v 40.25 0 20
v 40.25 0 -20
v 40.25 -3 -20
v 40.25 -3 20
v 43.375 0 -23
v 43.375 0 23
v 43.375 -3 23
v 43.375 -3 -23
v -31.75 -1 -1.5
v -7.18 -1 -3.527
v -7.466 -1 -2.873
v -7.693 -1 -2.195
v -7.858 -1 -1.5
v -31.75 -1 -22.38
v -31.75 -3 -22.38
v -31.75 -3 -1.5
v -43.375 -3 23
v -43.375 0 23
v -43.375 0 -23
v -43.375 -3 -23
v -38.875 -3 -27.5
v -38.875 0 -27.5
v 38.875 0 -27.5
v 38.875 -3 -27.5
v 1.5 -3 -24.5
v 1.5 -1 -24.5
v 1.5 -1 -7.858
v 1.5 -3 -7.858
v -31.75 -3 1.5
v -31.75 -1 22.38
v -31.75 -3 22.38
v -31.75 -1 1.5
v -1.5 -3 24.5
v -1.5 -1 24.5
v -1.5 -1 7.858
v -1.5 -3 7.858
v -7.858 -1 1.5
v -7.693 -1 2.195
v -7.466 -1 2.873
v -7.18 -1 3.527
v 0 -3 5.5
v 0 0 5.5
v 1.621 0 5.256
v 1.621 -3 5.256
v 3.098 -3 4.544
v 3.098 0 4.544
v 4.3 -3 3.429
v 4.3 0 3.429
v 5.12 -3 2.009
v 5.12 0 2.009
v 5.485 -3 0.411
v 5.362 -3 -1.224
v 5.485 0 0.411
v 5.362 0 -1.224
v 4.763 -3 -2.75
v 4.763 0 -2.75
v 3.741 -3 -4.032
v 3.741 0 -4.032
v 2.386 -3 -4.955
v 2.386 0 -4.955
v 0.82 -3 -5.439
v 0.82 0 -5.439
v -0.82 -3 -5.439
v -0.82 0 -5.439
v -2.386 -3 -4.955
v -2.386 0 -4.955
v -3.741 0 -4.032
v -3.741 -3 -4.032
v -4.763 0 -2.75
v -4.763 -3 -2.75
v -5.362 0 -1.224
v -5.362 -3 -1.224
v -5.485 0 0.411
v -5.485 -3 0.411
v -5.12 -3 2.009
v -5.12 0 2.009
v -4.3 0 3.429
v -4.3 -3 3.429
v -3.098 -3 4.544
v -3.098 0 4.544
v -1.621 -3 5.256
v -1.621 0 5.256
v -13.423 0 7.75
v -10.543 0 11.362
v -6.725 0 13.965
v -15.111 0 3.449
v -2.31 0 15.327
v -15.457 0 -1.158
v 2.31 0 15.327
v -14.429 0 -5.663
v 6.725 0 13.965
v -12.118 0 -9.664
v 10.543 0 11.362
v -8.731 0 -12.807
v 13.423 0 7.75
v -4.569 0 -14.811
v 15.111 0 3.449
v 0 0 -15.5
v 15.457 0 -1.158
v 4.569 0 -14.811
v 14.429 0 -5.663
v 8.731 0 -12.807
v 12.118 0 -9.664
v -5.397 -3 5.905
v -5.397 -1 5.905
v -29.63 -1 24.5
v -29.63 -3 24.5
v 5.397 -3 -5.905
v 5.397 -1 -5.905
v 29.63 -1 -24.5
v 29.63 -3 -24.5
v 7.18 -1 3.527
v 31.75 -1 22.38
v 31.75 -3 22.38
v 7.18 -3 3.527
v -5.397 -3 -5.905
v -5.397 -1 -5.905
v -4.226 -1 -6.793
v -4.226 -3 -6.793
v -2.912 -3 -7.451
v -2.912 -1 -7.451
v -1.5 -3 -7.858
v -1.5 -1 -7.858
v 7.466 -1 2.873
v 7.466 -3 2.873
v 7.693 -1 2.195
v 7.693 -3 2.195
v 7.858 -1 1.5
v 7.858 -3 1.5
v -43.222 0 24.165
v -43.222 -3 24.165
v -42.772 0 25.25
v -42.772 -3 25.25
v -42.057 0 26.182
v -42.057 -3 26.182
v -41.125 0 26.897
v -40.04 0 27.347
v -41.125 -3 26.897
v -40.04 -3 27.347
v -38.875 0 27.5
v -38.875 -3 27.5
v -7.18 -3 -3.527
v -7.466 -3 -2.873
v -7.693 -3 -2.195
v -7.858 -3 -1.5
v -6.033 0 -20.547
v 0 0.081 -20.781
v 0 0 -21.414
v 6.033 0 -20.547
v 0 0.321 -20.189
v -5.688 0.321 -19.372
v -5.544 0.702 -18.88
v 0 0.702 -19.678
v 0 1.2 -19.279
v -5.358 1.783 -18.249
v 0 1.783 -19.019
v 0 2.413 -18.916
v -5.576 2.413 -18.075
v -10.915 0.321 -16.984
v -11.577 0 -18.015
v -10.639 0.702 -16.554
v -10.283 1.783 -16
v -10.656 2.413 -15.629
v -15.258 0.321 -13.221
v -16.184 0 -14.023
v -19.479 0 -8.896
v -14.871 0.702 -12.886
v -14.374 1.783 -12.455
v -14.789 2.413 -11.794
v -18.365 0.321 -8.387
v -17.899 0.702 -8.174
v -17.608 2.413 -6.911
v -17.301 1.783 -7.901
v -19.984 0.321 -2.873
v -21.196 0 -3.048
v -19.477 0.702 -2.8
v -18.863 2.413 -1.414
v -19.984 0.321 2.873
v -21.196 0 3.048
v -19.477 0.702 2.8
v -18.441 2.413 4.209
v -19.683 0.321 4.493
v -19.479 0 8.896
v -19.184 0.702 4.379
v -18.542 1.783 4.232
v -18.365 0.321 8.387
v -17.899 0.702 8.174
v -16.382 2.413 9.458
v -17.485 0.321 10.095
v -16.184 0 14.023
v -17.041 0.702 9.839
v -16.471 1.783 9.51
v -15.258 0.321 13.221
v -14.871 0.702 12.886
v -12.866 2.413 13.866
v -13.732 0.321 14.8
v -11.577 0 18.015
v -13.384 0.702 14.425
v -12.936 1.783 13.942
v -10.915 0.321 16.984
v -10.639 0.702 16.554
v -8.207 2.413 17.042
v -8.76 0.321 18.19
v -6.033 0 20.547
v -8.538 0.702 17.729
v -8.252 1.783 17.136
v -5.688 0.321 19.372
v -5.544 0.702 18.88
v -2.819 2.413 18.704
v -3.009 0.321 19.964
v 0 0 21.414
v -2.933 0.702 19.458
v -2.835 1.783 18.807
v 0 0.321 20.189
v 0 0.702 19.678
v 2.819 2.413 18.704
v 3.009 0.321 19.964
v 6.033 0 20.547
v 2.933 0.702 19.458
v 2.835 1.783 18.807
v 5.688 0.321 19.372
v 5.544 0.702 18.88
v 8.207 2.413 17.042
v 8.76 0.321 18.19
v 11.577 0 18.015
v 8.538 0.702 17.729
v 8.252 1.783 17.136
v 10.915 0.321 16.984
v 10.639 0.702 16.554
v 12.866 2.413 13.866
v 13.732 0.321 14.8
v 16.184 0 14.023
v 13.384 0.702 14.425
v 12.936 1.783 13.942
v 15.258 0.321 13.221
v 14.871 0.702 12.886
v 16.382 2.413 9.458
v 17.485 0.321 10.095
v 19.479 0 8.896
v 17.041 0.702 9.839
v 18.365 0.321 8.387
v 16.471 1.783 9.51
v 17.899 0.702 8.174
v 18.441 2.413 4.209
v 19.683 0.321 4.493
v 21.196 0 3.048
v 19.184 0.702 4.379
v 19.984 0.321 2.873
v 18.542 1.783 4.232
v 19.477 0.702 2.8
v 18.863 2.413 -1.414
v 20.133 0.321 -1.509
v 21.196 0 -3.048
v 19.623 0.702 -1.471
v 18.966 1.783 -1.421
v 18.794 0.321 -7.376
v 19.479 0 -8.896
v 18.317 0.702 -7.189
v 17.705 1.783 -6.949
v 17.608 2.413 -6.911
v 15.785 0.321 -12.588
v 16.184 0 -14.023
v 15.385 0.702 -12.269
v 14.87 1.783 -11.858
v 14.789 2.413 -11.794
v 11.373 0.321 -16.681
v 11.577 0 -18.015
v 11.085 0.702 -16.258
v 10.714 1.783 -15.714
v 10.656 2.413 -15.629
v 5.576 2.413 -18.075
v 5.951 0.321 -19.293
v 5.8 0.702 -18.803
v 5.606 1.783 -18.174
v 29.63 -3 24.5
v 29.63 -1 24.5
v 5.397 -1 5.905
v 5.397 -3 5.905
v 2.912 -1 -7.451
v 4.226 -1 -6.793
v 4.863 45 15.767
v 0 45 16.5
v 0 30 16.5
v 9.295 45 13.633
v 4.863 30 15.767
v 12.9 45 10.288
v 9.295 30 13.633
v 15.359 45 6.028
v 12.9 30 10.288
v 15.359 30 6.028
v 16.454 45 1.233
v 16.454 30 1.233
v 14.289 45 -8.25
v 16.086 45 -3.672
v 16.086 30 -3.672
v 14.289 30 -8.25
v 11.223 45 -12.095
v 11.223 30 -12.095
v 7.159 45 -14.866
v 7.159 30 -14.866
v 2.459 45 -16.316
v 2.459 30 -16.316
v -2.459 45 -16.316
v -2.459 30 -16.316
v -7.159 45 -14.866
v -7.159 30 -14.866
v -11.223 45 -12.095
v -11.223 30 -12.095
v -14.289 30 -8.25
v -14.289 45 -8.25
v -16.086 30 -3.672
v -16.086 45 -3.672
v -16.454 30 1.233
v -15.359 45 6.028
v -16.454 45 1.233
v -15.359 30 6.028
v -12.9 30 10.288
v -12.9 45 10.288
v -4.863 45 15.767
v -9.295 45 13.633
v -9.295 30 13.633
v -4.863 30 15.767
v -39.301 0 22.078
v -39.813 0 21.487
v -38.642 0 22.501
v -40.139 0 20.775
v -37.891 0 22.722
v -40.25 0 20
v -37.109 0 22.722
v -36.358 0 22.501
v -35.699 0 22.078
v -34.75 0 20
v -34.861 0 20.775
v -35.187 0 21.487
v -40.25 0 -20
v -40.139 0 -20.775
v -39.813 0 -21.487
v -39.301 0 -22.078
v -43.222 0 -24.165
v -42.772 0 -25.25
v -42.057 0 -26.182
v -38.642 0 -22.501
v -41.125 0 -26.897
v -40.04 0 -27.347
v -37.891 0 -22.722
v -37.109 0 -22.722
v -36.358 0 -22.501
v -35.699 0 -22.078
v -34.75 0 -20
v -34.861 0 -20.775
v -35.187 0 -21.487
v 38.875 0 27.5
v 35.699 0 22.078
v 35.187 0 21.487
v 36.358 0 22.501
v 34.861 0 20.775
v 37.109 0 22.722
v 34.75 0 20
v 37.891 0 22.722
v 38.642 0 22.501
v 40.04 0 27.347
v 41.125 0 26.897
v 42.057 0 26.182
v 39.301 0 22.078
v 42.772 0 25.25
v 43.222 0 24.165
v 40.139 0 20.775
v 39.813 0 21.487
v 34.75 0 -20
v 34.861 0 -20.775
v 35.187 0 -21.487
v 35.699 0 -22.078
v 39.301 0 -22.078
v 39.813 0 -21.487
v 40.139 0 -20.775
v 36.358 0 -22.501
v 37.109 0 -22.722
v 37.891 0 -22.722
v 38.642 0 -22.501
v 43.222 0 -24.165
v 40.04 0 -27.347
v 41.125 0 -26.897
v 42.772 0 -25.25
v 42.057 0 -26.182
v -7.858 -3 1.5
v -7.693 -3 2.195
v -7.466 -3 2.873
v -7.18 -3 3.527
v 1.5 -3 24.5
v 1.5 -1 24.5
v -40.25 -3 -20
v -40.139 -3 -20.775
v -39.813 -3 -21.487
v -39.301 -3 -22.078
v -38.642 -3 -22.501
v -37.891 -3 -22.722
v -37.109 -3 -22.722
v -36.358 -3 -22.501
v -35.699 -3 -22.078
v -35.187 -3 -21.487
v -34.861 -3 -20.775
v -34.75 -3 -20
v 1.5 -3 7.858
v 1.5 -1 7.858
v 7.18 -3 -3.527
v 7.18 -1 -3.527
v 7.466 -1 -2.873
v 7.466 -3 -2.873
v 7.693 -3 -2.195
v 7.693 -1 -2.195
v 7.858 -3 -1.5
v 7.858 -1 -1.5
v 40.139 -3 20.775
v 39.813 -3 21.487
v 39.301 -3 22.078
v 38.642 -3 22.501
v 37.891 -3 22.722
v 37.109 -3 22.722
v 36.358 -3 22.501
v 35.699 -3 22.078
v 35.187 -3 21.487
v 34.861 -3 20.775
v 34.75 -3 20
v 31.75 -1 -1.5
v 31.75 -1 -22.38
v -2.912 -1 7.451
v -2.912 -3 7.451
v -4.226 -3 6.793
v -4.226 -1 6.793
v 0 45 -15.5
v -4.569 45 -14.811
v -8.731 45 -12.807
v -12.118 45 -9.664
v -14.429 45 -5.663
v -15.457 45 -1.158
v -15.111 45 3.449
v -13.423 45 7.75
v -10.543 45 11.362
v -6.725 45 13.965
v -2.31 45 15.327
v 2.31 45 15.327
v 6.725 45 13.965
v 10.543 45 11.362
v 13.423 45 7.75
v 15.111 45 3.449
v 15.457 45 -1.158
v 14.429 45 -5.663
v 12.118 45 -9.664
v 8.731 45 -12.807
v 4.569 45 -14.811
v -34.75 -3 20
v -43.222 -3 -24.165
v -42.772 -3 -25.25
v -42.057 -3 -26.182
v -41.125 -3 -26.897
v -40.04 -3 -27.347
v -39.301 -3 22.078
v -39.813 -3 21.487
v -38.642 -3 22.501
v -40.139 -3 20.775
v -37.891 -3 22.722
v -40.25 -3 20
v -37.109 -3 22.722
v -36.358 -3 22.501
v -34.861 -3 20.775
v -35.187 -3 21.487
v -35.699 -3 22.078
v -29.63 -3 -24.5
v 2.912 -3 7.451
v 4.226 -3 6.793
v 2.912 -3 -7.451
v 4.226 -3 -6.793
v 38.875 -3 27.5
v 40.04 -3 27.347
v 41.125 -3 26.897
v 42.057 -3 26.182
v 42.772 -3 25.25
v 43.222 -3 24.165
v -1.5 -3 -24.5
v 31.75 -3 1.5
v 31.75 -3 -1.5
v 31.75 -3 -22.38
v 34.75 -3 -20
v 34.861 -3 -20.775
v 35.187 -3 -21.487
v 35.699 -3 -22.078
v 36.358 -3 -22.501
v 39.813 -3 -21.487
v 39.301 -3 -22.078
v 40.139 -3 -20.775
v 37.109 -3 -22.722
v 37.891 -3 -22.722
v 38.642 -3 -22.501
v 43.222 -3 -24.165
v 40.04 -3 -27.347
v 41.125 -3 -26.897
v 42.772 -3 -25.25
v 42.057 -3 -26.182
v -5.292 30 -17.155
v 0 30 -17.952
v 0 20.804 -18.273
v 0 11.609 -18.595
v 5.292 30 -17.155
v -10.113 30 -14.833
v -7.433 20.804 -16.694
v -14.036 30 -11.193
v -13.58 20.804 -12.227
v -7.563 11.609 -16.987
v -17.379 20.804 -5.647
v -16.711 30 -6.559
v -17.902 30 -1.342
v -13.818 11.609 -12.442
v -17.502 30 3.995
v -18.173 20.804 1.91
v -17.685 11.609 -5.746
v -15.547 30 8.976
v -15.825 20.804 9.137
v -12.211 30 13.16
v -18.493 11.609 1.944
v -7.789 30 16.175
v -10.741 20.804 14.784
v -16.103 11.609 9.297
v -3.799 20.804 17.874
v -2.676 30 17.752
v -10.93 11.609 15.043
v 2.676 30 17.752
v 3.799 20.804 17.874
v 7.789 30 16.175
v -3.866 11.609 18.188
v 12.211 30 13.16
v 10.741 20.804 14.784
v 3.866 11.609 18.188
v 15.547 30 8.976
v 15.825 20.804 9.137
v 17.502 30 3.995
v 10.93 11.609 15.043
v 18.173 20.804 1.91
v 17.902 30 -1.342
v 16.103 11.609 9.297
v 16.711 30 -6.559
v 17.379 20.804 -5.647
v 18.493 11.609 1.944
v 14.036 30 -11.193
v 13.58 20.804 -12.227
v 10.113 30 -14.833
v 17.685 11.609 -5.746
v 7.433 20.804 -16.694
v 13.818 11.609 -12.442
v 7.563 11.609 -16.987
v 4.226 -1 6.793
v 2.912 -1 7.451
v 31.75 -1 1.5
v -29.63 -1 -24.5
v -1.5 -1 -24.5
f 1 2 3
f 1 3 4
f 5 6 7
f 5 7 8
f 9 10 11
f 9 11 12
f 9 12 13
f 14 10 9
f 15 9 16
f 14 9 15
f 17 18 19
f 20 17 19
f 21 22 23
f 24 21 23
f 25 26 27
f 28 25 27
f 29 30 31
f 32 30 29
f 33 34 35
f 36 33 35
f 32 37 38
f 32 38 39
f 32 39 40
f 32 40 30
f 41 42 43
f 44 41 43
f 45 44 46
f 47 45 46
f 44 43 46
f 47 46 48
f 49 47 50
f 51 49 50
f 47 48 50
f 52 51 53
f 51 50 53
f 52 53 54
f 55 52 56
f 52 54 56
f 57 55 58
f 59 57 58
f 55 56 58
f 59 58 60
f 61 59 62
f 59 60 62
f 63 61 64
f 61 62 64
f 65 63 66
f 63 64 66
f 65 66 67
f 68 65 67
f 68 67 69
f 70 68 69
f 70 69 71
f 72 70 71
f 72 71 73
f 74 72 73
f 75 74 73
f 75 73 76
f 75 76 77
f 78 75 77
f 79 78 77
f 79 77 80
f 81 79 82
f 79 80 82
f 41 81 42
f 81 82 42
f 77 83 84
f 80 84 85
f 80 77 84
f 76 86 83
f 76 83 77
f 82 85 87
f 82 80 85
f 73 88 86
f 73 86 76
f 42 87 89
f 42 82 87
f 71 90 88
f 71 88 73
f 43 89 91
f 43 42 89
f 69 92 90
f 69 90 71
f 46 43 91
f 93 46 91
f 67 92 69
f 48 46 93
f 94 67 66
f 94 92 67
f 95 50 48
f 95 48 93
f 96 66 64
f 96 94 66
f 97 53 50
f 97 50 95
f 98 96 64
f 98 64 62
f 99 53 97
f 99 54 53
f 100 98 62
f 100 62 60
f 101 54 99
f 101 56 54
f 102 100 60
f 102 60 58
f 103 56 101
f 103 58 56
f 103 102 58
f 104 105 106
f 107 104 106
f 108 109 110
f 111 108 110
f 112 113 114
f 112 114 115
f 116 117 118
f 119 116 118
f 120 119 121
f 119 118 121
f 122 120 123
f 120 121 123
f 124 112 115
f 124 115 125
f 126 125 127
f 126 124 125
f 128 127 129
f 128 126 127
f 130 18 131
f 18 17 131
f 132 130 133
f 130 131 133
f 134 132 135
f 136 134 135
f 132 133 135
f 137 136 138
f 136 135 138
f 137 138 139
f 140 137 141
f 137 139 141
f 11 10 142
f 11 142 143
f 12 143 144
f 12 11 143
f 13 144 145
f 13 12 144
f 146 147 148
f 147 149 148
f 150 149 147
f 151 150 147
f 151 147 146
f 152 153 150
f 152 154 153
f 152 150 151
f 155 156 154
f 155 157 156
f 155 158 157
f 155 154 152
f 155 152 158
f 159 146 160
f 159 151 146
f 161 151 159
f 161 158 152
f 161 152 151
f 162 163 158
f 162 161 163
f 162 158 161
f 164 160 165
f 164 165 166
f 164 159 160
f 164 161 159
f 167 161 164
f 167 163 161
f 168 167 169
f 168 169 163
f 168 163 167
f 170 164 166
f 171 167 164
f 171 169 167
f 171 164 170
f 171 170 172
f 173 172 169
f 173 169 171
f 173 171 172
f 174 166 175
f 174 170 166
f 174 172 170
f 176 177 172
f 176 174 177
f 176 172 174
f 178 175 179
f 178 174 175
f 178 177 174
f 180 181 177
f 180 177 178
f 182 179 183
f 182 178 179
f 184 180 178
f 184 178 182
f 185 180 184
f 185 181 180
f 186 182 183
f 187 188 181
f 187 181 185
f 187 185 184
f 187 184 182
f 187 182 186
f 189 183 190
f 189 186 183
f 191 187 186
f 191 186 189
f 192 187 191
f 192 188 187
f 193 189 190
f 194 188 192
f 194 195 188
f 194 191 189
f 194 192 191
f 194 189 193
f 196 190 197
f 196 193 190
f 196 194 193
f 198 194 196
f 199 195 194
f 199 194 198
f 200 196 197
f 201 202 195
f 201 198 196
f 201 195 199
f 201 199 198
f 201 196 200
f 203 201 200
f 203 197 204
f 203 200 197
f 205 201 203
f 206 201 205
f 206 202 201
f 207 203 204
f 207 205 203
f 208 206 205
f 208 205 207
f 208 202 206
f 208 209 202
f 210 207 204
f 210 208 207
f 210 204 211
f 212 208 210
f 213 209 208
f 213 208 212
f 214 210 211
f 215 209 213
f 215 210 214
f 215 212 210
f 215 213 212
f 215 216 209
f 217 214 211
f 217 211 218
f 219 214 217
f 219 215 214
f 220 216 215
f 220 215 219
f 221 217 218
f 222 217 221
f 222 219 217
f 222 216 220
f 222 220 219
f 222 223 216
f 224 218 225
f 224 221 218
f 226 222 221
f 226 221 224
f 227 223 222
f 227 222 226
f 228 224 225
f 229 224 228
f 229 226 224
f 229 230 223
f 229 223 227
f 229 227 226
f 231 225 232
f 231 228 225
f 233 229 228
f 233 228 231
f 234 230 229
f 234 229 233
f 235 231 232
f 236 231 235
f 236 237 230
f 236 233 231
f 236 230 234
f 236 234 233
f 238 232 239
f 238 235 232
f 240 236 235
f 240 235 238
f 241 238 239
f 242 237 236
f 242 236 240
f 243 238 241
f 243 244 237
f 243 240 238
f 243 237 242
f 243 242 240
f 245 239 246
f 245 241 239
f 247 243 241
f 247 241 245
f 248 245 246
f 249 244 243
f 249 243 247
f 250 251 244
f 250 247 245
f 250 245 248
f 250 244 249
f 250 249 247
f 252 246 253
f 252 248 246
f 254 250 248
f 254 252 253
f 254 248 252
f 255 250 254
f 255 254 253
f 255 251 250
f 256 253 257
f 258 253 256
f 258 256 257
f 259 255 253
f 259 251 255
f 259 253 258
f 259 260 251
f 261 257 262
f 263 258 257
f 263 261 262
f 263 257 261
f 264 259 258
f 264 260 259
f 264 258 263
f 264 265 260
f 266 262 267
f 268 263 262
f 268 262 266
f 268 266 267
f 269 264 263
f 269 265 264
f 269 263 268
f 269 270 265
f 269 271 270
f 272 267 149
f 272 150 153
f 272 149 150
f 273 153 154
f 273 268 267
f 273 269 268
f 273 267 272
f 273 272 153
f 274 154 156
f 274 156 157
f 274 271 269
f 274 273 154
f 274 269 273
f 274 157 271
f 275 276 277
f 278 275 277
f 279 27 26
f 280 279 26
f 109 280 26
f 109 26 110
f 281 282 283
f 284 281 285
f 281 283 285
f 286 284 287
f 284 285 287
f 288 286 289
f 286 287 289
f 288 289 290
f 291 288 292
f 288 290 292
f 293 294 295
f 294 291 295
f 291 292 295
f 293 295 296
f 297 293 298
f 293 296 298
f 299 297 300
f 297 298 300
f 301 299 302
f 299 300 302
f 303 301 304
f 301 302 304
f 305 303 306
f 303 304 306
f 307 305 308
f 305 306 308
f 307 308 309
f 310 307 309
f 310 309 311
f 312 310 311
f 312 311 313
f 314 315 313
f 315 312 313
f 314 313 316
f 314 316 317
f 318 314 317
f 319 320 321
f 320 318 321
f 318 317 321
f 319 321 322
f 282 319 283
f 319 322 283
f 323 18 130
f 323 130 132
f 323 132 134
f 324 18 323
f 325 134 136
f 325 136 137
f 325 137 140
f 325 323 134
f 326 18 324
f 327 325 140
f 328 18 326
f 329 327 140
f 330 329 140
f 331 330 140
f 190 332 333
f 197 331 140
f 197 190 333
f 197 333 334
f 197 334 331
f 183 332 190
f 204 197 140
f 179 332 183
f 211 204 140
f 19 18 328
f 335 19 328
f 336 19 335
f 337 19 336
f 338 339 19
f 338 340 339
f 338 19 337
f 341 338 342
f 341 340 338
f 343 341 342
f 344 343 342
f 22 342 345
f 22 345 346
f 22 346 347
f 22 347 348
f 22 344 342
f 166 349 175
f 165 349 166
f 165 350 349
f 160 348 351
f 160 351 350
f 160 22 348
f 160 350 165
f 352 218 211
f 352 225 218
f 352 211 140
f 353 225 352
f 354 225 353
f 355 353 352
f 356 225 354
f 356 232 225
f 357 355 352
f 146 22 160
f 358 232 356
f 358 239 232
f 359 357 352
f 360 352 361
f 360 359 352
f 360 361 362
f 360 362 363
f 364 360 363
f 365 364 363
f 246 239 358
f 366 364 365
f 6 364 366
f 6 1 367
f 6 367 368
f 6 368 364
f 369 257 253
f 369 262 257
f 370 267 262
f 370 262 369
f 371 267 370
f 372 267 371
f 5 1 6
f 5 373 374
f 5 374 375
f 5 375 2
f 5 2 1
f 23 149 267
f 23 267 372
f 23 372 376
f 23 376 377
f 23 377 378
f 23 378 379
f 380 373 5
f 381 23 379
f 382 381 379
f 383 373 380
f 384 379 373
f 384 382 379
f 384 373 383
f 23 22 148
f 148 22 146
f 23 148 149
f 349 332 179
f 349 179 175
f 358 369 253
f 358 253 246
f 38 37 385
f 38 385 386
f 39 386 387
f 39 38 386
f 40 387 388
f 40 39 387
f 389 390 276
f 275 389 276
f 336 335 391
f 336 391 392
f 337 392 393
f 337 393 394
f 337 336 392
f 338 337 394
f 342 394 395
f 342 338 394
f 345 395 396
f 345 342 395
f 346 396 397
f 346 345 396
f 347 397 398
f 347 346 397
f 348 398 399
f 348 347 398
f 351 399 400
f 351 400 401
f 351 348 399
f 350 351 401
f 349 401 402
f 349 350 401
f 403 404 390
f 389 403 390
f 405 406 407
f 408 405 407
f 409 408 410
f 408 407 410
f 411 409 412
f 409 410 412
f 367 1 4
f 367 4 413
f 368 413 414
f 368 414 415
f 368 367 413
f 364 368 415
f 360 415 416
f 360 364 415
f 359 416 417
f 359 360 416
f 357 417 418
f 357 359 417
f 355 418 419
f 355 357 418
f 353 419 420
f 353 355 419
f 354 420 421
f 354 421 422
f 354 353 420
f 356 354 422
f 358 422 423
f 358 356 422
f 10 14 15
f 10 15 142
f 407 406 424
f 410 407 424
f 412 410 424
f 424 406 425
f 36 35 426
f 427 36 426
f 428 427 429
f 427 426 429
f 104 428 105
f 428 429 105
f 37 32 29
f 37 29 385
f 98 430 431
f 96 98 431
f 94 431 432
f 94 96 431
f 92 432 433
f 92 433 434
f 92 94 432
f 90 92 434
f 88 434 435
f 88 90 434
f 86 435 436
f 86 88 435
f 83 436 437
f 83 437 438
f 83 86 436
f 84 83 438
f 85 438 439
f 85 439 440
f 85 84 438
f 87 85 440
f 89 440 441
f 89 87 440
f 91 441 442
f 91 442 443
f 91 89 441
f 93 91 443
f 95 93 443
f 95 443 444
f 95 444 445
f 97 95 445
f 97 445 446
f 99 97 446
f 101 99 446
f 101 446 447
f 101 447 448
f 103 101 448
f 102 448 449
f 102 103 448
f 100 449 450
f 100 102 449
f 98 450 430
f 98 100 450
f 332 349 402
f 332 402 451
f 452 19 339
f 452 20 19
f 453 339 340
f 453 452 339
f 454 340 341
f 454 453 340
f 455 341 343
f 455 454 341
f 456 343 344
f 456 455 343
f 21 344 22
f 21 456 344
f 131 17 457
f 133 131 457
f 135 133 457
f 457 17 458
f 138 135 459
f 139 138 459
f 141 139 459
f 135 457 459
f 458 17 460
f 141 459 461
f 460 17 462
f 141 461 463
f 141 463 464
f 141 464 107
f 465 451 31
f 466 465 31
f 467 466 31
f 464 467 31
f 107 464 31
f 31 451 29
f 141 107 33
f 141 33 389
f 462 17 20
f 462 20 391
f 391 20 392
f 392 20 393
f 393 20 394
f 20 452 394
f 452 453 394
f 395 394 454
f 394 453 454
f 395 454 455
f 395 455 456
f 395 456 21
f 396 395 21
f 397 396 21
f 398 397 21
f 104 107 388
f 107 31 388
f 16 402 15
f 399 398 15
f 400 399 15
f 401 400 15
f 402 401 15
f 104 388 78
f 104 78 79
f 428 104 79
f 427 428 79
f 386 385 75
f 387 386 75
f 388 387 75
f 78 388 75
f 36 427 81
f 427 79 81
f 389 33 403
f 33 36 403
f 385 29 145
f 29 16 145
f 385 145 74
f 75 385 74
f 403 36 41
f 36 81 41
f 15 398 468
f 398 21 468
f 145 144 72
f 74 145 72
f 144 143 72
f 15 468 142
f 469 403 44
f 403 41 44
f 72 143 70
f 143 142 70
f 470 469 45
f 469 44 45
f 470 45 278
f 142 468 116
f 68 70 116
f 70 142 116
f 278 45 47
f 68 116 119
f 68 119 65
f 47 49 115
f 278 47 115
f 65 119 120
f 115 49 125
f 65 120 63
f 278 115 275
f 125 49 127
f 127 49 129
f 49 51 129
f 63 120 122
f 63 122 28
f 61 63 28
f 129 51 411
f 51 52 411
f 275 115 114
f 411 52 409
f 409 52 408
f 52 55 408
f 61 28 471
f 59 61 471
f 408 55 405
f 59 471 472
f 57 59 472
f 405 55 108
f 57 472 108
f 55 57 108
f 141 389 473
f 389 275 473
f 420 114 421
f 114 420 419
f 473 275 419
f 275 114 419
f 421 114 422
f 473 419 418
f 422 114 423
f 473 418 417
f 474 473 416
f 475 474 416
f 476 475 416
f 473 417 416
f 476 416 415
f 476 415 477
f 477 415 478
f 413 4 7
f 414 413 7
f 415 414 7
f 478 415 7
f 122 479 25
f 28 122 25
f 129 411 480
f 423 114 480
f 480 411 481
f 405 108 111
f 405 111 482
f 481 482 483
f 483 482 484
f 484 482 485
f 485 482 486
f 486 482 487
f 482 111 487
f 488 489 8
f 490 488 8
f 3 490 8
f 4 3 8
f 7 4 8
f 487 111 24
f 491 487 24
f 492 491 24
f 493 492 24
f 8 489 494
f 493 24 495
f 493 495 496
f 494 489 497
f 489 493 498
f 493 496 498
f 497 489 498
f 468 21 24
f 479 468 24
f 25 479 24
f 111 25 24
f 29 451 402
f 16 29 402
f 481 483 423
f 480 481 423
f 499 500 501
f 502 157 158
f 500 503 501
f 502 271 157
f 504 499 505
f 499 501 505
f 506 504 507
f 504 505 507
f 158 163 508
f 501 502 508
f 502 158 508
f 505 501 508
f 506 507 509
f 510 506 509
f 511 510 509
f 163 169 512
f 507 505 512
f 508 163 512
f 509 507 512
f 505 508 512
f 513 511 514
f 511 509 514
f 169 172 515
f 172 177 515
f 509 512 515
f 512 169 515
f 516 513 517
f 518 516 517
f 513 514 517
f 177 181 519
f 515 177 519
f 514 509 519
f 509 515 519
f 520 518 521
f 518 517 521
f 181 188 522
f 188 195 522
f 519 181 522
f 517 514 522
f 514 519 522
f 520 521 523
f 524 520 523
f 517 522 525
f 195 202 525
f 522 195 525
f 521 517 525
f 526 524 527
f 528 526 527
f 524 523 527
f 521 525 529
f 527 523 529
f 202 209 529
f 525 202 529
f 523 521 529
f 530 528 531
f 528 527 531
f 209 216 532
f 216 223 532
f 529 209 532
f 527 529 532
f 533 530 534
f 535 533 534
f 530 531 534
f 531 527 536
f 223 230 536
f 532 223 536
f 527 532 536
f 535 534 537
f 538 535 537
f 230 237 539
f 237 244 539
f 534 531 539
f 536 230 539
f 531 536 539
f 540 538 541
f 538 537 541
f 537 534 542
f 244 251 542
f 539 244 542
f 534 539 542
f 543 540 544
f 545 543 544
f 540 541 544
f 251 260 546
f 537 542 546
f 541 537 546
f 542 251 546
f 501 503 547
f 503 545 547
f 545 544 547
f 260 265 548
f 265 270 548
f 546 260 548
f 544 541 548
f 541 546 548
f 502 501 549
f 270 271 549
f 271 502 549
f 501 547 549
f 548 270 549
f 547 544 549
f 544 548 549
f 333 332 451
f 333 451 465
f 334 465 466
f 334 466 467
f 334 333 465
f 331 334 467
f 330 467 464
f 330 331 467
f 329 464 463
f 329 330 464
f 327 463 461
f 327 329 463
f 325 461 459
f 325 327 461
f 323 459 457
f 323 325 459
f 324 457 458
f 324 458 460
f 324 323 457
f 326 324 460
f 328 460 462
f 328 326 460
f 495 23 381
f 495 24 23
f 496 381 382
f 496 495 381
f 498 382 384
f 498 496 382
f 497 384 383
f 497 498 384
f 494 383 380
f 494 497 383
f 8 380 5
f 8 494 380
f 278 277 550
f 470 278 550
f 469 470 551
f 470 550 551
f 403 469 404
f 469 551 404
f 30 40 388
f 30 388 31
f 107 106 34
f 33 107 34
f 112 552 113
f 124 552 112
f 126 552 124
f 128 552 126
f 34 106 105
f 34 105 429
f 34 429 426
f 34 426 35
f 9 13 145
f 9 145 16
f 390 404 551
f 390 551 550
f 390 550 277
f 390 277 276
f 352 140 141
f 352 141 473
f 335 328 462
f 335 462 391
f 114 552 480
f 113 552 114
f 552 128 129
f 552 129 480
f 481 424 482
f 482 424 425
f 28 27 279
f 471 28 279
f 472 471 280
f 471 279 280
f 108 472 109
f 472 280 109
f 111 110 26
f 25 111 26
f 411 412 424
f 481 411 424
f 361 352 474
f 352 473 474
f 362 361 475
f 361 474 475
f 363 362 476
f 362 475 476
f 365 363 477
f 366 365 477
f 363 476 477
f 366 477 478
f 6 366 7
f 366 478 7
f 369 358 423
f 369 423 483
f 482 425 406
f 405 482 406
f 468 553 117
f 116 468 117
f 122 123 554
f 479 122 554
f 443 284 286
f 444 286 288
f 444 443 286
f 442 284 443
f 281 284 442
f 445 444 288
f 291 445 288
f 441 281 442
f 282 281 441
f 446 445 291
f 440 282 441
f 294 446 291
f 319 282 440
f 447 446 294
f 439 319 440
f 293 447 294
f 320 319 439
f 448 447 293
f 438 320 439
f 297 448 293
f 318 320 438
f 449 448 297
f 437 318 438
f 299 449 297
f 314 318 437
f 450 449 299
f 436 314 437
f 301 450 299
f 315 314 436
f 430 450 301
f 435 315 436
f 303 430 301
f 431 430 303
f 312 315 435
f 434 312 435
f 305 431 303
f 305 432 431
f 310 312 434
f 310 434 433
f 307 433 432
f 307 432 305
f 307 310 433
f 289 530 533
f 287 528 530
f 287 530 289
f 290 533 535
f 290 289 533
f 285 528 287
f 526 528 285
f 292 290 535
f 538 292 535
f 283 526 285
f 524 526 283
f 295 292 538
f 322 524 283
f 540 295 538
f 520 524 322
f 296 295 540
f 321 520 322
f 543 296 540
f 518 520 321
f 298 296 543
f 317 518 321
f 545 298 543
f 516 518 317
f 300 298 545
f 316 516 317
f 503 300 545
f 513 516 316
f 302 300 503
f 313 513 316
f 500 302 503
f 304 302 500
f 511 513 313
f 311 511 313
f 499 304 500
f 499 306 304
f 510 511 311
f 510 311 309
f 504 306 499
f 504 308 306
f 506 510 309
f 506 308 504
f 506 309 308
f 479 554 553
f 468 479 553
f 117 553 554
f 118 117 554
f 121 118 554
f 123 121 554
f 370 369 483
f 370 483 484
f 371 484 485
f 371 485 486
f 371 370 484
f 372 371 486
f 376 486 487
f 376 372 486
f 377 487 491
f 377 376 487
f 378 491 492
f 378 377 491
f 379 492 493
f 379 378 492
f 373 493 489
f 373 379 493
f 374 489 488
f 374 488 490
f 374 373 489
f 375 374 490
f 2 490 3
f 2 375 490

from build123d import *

# Parameters (mm, degrees)
SKETCH1_W           = 86.75
SKETCH1_H           = 55
SKETCH1_R           = 5.5
BOSS_EXTRUDE1_DEPTH = 3
FILLET1_R           = 4.5
SKETCH6_R           = 19
SKETCH6_R_2         = 15.5
BOSS_EXTRUDE3_DEPTH = 45
CUT_EXTRUDE1_REACH  = 71.284
CUT_EXTRUDE1_START  = -1
CUT_EXTRUDE3_REACH  = 63.046
SKETCH12_R          = 19
SKETCH12_R_2        = 16.5
DRAFT8_ANGLE        = 2
FILLET3_R           = 2.5


with BuildPart() as part:
    # Sketch1 → Boss-Extrude1 (new body)
    with BuildSketch(Plane(origin=(0, 0, 0), x_dir=(1, 0, 0), z_dir=(0, 1, 0))):
        Rectangle(SKETCH1_W, SKETCH1_H)
        with Locations(Location((0, 0, 0), (0, 0, 270))):
            Circle(SKETCH1_R, mode=Mode.SUBTRACT)
        with BuildLine():
            Line((-34.75, 20), (-34.75, -20))
            ThreePointArc((-34.75, -20), (-37.5, -22.75), (-40.25, -20))
            Line((-40.25, -20), (-40.25, 20))
            ThreePointArc((-40.25, 20), (-37.5, 22.75), (-34.75, 20))
        make_face(mode=Mode.SUBTRACT)
        with BuildLine():
            Line((40.25, 20), (40.25, -20))
            ThreePointArc((40.25, -20), (37.5, -22.75), (34.75, -20))
            Line((34.75, -20), (34.75, 20))
            ThreePointArc((34.75, 20), (37.5, 22.75), (40.25, 20))
        make_face(mode=Mode.SUBTRACT)
    extrude(amount=-BOSS_EXTRUDE1_DEPTH)

    # Fillet1
    fillet1_edges = [part.edges().sort_by_distance(p)[0] for p in [
        (-43.375, -1.5, -27.5),
        (43.375, -1.5, -27.5),
        (43.375, -1.5, 27.5),
        (-43.375, -1.5, 27.5),
    ]]
    fillet(fillet1_edges, radius=FILLET1_R)

    # Sketch6 → Boss-Extrude3 (add)
    with BuildSketch(Plane(origin=(0, 0, 0), x_dir=(1, 0, 0), z_dir=(0, 1, 0))):
        with Locations(Location((0, 0, 0), (0, 0, 90))):
            Circle(SKETCH6_R)
        with Locations(Location((0, 0, 0), (0, 0, 90))):
            Circle(SKETCH6_R_2, mode=Mode.SUBTRACT)
    extrude(amount=BOSS_EXTRUDE3_DEPTH)

    # Sketch9 → Cut-Extrude1 (cut, up to next)
    with BuildSketch(Plane(origin=(0, 0, 0), x_dir=(1, 0, 0), z_dir=(0, 1, 0)).offset(CUT_EXTRUDE1_START), mode=Mode.PRIVATE) as cut_extrude1_sk1:
        with BuildLine():
            Line((-31.75, -22.38), (-31.75, -1.5))
            Line((-31.75, -1.5), (-7.858116823, -1.5))
            ThreePointArc((-7.858116823, -1.5), (-7.587302584, -2.536304301), (-7.180478008, -3.527142694))
            Line((-7.180478008, -3.527142694), (-31.75, -22.38))
        make_face()
    cut_extrude1_tool1 = extrude(cut_extrude1_sk1.sketch, amount=-CUT_EXTRUDE1_REACH, mode=Mode.PRIVATE) & part.part
    # Sketch9 → Cut-Extrude1 (cut, up to next)
    with BuildSketch(Plane(origin=(0, 0, 0), x_dir=(1, 0, 0), z_dir=(0, 1, 0)).offset(CUT_EXTRUDE1_START), mode=Mode.PRIVATE) as cut_extrude1_sk2:
        with BuildLine():
            Line((-31.75, 22.38), (-7.180478008, 3.527142694))
            ThreePointArc((-7.180478008, 3.527142694), (-7.587302584, 2.536304301), (-7.858116823, 1.5))
            Line((-7.858116823, 1.5), (-31.75, 1.5))
            Line((-31.75, 1.5), (-31.75, 22.38))
        make_face()
    cut_extrude1_tool2 = extrude(cut_extrude1_sk2.sketch, amount=-CUT_EXTRUDE1_REACH, mode=Mode.PRIVATE) & part.part
    # Sketch9 → Cut-Extrude1 (cut, up to next)
    with BuildSketch(Plane(origin=(0, 0, 0), x_dir=(1, 0, 0), z_dir=(0, 1, 0)).offset(CUT_EXTRUDE1_START), mode=Mode.PRIVATE) as cut_extrude1_sk3:
        with BuildLine():
            Line((-29.63, -24.5), (-1.5, -24.5))
            Line((-1.5, -24.5), (-1.5, -7.858116823))
            ThreePointArc((-1.5, -7.858116823), (-3.584038711, -7.152249053), (-5.39695236, -5.905328545))
            Line((-5.39695236, -5.905328545), (-29.63, -24.5))
        make_face()
    cut_extrude1_tool3 = extrude(cut_extrude1_sk3.sketch, amount=-CUT_EXTRUDE1_REACH, mode=Mode.PRIVATE) & part.part
    # Sketch9 → Cut-Extrude1 (cut, up to next)
    with BuildSketch(Plane(origin=(0, 0, 0), x_dir=(1, 0, 0), z_dir=(0, 1, 0)).offset(CUT_EXTRUDE1_START), mode=Mode.PRIVATE) as cut_extrude1_sk4:
        with BuildLine():
            Line((29.63, -24.5), (5.39695236, -5.905328545))
            ThreePointArc((5.39695236, -5.905328545), (3.584038711, -7.152249053), (1.5, -7.858116823))
            Line((1.5, -7.858116823), (1.5, -24.5))
            Line((1.5, -24.5), (29.63, -24.5))
        make_face()
    cut_extrude1_tool4 = extrude(cut_extrude1_sk4.sketch, amount=-CUT_EXTRUDE1_REACH, mode=Mode.PRIVATE) & part.part
    # Sketch9 → Cut-Extrude1 (cut, up to next)
    with BuildSketch(Plane(origin=(0, 0, 0), x_dir=(1, 0, 0), z_dir=(0, 1, 0)).offset(CUT_EXTRUDE1_START), mode=Mode.PRIVATE) as cut_extrude1_sk5:
        with BuildLine():
            Line((1.5, 24.5), (1.5, 7.858116823))
            ThreePointArc((1.5, 7.858116823), (3.584038711, 7.152249053), (5.39695236, 5.905328545))
            Line((5.39695236, 5.905328545), (29.63, 24.5))
            Line((29.63, 24.5), (1.5, 24.5))
        make_face()
    cut_extrude1_tool5 = extrude(cut_extrude1_sk5.sketch, amount=-CUT_EXTRUDE1_REACH, mode=Mode.PRIVATE) & part.part
    # Sketch9 → Cut-Extrude1 (cut, up to next)
    with BuildSketch(Plane(origin=(0, 0, 0), x_dir=(1, 0, 0), z_dir=(0, 1, 0)).offset(CUT_EXTRUDE1_START), mode=Mode.PRIVATE) as cut_extrude1_sk6:
        with BuildLine():
            Line((-29.63, 24.5), (-5.39695236, 5.905328545))
            ThreePointArc((-5.39695236, 5.905328545), (-3.584038711, 7.152249053), (-1.5, 7.858116823))
            Line((-1.5, 7.858116823), (-1.5, 24.5))
            Line((-1.5, 24.5), (-29.63, 24.5))
        make_face()
    cut_extrude1_tool6 = extrude(cut_extrude1_sk6.sketch, amount=-CUT_EXTRUDE1_REACH, mode=Mode.PRIVATE) & part.part
    # Sketch9 → Cut-Extrude1 (cut, up to next)
    with BuildSketch(Plane(origin=(0, 0, 0), x_dir=(1, 0, 0), z_dir=(0, 1, 0)).offset(CUT_EXTRUDE1_START), mode=Mode.PRIVATE) as cut_extrude1_sk7:
        with BuildLine():
            Line((31.75, 1.5), (31.75, 22.38))
            Line((31.75, 22.38), (7.180478008, 3.527142694))
            ThreePointArc((7.180478008, 3.527142694), (7.587302584, 2.536304301), (7.858116823, 1.5))
            Line((7.858116823, 1.5), (31.75, 1.5))
        make_face()
    cut_extrude1_tool7 = extrude(cut_extrude1_sk7.sketch, amount=-CUT_EXTRUDE1_REACH, mode=Mode.PRIVATE) & part.part
    # Sketch9 → Cut-Extrude1 (cut, up to next)
    with BuildSketch(Plane(origin=(0, 0, 0), x_dir=(1, 0, 0), z_dir=(0, 1, 0)).offset(CUT_EXTRUDE1_START), mode=Mode.PRIVATE) as cut_extrude1_sk8:
        with BuildLine():
            Line((31.75, -22.38), (7.180478008, -3.527142694))
            ThreePointArc((7.180478008, -3.527142694), (7.587302584, -2.536304301), (7.858116823, -1.5))
            Line((7.858116823, -1.5), (31.75, -1.5))
            Line((31.75, -1.5), (31.75, -22.38))
        make_face()
    cut_extrude1_tool8 = extrude(cut_extrude1_sk8.sketch, amount=-CUT_EXTRUDE1_REACH, mode=Mode.PRIVATE) & part.part
    add(cut_extrude1_tool1.solids().sort_by_distance((-22.878744, -1, 8.53751))[0], mode=Mode.SUBTRACT)
    add(cut_extrude1_tool2.solids().sort_by_distance((-22.878744, -1, -8.53751))[0], mode=Mode.SUBTRACT)
    add(cut_extrude1_tool3.solids().sort_by_distance((-11.164331, -1, 17.722088))[0], mode=Mode.SUBTRACT)
    add(cut_extrude1_tool4.solids().sort_by_distance((11.164331, -1, 17.722088))[0], mode=Mode.SUBTRACT)
    add(cut_extrude1_tool5.solids().sort_by_distance((11.164331, -1, -17.722088))[0], mode=Mode.SUBTRACT)
    add(cut_extrude1_tool6.solids().sort_by_distance((-11.164331, -1, -17.722088))[0], mode=Mode.SUBTRACT)
    add(cut_extrude1_tool7.solids().sort_by_distance((22.878744, -1, -8.53751))[0], mode=Mode.SUBTRACT)
    add(cut_extrude1_tool8.solids().sort_by_distance((22.878744, -1, 8.53751))[0], mode=Mode.SUBTRACT)

    # Sketch12 → Cut-Extrude3 (cut, up to next)
    with BuildSketch(Plane(origin=(0, 30, 0), x_dir=(1, 0, 0), z_dir=(0, 1, 0)), mode=Mode.PRIVATE) as cut_extrude3_sk1:
        with Locations(Location((0, 0, 0), (0, 0, 90))):
            Circle(SKETCH12_R)
        with Locations(Location((0, 0, 0), (0, 0, 270))):
            Circle(SKETCH12_R_2, mode=Mode.SUBTRACT)
    cut_extrude3_tool1 = extrude(cut_extrude3_sk1.sketch, amount=CUT_EXTRUDE3_REACH, mode=Mode.PRIVATE) & part.part
    add(cut_extrude3_tool1.solids().sort_by_distance((0, 30, 18.462599))[0], mode=Mode.SUBTRACT)

    # Draft8
    draft8_faces = [part.faces().sort_by_distance(p)[0] for p in [
        (0, 15, 19),
    ]]
    draft(draft8_faces, Plane.ZX, DRAFT8_ANGLE)

    # Fillet3
    fillet3_edges = [part.edges().sort_by_distance(p)[0] for p in [
        (0, 0, 19),
    ]]
    fillet(fillet3_edges, radius=FILLET3_R)


solid = part.part
